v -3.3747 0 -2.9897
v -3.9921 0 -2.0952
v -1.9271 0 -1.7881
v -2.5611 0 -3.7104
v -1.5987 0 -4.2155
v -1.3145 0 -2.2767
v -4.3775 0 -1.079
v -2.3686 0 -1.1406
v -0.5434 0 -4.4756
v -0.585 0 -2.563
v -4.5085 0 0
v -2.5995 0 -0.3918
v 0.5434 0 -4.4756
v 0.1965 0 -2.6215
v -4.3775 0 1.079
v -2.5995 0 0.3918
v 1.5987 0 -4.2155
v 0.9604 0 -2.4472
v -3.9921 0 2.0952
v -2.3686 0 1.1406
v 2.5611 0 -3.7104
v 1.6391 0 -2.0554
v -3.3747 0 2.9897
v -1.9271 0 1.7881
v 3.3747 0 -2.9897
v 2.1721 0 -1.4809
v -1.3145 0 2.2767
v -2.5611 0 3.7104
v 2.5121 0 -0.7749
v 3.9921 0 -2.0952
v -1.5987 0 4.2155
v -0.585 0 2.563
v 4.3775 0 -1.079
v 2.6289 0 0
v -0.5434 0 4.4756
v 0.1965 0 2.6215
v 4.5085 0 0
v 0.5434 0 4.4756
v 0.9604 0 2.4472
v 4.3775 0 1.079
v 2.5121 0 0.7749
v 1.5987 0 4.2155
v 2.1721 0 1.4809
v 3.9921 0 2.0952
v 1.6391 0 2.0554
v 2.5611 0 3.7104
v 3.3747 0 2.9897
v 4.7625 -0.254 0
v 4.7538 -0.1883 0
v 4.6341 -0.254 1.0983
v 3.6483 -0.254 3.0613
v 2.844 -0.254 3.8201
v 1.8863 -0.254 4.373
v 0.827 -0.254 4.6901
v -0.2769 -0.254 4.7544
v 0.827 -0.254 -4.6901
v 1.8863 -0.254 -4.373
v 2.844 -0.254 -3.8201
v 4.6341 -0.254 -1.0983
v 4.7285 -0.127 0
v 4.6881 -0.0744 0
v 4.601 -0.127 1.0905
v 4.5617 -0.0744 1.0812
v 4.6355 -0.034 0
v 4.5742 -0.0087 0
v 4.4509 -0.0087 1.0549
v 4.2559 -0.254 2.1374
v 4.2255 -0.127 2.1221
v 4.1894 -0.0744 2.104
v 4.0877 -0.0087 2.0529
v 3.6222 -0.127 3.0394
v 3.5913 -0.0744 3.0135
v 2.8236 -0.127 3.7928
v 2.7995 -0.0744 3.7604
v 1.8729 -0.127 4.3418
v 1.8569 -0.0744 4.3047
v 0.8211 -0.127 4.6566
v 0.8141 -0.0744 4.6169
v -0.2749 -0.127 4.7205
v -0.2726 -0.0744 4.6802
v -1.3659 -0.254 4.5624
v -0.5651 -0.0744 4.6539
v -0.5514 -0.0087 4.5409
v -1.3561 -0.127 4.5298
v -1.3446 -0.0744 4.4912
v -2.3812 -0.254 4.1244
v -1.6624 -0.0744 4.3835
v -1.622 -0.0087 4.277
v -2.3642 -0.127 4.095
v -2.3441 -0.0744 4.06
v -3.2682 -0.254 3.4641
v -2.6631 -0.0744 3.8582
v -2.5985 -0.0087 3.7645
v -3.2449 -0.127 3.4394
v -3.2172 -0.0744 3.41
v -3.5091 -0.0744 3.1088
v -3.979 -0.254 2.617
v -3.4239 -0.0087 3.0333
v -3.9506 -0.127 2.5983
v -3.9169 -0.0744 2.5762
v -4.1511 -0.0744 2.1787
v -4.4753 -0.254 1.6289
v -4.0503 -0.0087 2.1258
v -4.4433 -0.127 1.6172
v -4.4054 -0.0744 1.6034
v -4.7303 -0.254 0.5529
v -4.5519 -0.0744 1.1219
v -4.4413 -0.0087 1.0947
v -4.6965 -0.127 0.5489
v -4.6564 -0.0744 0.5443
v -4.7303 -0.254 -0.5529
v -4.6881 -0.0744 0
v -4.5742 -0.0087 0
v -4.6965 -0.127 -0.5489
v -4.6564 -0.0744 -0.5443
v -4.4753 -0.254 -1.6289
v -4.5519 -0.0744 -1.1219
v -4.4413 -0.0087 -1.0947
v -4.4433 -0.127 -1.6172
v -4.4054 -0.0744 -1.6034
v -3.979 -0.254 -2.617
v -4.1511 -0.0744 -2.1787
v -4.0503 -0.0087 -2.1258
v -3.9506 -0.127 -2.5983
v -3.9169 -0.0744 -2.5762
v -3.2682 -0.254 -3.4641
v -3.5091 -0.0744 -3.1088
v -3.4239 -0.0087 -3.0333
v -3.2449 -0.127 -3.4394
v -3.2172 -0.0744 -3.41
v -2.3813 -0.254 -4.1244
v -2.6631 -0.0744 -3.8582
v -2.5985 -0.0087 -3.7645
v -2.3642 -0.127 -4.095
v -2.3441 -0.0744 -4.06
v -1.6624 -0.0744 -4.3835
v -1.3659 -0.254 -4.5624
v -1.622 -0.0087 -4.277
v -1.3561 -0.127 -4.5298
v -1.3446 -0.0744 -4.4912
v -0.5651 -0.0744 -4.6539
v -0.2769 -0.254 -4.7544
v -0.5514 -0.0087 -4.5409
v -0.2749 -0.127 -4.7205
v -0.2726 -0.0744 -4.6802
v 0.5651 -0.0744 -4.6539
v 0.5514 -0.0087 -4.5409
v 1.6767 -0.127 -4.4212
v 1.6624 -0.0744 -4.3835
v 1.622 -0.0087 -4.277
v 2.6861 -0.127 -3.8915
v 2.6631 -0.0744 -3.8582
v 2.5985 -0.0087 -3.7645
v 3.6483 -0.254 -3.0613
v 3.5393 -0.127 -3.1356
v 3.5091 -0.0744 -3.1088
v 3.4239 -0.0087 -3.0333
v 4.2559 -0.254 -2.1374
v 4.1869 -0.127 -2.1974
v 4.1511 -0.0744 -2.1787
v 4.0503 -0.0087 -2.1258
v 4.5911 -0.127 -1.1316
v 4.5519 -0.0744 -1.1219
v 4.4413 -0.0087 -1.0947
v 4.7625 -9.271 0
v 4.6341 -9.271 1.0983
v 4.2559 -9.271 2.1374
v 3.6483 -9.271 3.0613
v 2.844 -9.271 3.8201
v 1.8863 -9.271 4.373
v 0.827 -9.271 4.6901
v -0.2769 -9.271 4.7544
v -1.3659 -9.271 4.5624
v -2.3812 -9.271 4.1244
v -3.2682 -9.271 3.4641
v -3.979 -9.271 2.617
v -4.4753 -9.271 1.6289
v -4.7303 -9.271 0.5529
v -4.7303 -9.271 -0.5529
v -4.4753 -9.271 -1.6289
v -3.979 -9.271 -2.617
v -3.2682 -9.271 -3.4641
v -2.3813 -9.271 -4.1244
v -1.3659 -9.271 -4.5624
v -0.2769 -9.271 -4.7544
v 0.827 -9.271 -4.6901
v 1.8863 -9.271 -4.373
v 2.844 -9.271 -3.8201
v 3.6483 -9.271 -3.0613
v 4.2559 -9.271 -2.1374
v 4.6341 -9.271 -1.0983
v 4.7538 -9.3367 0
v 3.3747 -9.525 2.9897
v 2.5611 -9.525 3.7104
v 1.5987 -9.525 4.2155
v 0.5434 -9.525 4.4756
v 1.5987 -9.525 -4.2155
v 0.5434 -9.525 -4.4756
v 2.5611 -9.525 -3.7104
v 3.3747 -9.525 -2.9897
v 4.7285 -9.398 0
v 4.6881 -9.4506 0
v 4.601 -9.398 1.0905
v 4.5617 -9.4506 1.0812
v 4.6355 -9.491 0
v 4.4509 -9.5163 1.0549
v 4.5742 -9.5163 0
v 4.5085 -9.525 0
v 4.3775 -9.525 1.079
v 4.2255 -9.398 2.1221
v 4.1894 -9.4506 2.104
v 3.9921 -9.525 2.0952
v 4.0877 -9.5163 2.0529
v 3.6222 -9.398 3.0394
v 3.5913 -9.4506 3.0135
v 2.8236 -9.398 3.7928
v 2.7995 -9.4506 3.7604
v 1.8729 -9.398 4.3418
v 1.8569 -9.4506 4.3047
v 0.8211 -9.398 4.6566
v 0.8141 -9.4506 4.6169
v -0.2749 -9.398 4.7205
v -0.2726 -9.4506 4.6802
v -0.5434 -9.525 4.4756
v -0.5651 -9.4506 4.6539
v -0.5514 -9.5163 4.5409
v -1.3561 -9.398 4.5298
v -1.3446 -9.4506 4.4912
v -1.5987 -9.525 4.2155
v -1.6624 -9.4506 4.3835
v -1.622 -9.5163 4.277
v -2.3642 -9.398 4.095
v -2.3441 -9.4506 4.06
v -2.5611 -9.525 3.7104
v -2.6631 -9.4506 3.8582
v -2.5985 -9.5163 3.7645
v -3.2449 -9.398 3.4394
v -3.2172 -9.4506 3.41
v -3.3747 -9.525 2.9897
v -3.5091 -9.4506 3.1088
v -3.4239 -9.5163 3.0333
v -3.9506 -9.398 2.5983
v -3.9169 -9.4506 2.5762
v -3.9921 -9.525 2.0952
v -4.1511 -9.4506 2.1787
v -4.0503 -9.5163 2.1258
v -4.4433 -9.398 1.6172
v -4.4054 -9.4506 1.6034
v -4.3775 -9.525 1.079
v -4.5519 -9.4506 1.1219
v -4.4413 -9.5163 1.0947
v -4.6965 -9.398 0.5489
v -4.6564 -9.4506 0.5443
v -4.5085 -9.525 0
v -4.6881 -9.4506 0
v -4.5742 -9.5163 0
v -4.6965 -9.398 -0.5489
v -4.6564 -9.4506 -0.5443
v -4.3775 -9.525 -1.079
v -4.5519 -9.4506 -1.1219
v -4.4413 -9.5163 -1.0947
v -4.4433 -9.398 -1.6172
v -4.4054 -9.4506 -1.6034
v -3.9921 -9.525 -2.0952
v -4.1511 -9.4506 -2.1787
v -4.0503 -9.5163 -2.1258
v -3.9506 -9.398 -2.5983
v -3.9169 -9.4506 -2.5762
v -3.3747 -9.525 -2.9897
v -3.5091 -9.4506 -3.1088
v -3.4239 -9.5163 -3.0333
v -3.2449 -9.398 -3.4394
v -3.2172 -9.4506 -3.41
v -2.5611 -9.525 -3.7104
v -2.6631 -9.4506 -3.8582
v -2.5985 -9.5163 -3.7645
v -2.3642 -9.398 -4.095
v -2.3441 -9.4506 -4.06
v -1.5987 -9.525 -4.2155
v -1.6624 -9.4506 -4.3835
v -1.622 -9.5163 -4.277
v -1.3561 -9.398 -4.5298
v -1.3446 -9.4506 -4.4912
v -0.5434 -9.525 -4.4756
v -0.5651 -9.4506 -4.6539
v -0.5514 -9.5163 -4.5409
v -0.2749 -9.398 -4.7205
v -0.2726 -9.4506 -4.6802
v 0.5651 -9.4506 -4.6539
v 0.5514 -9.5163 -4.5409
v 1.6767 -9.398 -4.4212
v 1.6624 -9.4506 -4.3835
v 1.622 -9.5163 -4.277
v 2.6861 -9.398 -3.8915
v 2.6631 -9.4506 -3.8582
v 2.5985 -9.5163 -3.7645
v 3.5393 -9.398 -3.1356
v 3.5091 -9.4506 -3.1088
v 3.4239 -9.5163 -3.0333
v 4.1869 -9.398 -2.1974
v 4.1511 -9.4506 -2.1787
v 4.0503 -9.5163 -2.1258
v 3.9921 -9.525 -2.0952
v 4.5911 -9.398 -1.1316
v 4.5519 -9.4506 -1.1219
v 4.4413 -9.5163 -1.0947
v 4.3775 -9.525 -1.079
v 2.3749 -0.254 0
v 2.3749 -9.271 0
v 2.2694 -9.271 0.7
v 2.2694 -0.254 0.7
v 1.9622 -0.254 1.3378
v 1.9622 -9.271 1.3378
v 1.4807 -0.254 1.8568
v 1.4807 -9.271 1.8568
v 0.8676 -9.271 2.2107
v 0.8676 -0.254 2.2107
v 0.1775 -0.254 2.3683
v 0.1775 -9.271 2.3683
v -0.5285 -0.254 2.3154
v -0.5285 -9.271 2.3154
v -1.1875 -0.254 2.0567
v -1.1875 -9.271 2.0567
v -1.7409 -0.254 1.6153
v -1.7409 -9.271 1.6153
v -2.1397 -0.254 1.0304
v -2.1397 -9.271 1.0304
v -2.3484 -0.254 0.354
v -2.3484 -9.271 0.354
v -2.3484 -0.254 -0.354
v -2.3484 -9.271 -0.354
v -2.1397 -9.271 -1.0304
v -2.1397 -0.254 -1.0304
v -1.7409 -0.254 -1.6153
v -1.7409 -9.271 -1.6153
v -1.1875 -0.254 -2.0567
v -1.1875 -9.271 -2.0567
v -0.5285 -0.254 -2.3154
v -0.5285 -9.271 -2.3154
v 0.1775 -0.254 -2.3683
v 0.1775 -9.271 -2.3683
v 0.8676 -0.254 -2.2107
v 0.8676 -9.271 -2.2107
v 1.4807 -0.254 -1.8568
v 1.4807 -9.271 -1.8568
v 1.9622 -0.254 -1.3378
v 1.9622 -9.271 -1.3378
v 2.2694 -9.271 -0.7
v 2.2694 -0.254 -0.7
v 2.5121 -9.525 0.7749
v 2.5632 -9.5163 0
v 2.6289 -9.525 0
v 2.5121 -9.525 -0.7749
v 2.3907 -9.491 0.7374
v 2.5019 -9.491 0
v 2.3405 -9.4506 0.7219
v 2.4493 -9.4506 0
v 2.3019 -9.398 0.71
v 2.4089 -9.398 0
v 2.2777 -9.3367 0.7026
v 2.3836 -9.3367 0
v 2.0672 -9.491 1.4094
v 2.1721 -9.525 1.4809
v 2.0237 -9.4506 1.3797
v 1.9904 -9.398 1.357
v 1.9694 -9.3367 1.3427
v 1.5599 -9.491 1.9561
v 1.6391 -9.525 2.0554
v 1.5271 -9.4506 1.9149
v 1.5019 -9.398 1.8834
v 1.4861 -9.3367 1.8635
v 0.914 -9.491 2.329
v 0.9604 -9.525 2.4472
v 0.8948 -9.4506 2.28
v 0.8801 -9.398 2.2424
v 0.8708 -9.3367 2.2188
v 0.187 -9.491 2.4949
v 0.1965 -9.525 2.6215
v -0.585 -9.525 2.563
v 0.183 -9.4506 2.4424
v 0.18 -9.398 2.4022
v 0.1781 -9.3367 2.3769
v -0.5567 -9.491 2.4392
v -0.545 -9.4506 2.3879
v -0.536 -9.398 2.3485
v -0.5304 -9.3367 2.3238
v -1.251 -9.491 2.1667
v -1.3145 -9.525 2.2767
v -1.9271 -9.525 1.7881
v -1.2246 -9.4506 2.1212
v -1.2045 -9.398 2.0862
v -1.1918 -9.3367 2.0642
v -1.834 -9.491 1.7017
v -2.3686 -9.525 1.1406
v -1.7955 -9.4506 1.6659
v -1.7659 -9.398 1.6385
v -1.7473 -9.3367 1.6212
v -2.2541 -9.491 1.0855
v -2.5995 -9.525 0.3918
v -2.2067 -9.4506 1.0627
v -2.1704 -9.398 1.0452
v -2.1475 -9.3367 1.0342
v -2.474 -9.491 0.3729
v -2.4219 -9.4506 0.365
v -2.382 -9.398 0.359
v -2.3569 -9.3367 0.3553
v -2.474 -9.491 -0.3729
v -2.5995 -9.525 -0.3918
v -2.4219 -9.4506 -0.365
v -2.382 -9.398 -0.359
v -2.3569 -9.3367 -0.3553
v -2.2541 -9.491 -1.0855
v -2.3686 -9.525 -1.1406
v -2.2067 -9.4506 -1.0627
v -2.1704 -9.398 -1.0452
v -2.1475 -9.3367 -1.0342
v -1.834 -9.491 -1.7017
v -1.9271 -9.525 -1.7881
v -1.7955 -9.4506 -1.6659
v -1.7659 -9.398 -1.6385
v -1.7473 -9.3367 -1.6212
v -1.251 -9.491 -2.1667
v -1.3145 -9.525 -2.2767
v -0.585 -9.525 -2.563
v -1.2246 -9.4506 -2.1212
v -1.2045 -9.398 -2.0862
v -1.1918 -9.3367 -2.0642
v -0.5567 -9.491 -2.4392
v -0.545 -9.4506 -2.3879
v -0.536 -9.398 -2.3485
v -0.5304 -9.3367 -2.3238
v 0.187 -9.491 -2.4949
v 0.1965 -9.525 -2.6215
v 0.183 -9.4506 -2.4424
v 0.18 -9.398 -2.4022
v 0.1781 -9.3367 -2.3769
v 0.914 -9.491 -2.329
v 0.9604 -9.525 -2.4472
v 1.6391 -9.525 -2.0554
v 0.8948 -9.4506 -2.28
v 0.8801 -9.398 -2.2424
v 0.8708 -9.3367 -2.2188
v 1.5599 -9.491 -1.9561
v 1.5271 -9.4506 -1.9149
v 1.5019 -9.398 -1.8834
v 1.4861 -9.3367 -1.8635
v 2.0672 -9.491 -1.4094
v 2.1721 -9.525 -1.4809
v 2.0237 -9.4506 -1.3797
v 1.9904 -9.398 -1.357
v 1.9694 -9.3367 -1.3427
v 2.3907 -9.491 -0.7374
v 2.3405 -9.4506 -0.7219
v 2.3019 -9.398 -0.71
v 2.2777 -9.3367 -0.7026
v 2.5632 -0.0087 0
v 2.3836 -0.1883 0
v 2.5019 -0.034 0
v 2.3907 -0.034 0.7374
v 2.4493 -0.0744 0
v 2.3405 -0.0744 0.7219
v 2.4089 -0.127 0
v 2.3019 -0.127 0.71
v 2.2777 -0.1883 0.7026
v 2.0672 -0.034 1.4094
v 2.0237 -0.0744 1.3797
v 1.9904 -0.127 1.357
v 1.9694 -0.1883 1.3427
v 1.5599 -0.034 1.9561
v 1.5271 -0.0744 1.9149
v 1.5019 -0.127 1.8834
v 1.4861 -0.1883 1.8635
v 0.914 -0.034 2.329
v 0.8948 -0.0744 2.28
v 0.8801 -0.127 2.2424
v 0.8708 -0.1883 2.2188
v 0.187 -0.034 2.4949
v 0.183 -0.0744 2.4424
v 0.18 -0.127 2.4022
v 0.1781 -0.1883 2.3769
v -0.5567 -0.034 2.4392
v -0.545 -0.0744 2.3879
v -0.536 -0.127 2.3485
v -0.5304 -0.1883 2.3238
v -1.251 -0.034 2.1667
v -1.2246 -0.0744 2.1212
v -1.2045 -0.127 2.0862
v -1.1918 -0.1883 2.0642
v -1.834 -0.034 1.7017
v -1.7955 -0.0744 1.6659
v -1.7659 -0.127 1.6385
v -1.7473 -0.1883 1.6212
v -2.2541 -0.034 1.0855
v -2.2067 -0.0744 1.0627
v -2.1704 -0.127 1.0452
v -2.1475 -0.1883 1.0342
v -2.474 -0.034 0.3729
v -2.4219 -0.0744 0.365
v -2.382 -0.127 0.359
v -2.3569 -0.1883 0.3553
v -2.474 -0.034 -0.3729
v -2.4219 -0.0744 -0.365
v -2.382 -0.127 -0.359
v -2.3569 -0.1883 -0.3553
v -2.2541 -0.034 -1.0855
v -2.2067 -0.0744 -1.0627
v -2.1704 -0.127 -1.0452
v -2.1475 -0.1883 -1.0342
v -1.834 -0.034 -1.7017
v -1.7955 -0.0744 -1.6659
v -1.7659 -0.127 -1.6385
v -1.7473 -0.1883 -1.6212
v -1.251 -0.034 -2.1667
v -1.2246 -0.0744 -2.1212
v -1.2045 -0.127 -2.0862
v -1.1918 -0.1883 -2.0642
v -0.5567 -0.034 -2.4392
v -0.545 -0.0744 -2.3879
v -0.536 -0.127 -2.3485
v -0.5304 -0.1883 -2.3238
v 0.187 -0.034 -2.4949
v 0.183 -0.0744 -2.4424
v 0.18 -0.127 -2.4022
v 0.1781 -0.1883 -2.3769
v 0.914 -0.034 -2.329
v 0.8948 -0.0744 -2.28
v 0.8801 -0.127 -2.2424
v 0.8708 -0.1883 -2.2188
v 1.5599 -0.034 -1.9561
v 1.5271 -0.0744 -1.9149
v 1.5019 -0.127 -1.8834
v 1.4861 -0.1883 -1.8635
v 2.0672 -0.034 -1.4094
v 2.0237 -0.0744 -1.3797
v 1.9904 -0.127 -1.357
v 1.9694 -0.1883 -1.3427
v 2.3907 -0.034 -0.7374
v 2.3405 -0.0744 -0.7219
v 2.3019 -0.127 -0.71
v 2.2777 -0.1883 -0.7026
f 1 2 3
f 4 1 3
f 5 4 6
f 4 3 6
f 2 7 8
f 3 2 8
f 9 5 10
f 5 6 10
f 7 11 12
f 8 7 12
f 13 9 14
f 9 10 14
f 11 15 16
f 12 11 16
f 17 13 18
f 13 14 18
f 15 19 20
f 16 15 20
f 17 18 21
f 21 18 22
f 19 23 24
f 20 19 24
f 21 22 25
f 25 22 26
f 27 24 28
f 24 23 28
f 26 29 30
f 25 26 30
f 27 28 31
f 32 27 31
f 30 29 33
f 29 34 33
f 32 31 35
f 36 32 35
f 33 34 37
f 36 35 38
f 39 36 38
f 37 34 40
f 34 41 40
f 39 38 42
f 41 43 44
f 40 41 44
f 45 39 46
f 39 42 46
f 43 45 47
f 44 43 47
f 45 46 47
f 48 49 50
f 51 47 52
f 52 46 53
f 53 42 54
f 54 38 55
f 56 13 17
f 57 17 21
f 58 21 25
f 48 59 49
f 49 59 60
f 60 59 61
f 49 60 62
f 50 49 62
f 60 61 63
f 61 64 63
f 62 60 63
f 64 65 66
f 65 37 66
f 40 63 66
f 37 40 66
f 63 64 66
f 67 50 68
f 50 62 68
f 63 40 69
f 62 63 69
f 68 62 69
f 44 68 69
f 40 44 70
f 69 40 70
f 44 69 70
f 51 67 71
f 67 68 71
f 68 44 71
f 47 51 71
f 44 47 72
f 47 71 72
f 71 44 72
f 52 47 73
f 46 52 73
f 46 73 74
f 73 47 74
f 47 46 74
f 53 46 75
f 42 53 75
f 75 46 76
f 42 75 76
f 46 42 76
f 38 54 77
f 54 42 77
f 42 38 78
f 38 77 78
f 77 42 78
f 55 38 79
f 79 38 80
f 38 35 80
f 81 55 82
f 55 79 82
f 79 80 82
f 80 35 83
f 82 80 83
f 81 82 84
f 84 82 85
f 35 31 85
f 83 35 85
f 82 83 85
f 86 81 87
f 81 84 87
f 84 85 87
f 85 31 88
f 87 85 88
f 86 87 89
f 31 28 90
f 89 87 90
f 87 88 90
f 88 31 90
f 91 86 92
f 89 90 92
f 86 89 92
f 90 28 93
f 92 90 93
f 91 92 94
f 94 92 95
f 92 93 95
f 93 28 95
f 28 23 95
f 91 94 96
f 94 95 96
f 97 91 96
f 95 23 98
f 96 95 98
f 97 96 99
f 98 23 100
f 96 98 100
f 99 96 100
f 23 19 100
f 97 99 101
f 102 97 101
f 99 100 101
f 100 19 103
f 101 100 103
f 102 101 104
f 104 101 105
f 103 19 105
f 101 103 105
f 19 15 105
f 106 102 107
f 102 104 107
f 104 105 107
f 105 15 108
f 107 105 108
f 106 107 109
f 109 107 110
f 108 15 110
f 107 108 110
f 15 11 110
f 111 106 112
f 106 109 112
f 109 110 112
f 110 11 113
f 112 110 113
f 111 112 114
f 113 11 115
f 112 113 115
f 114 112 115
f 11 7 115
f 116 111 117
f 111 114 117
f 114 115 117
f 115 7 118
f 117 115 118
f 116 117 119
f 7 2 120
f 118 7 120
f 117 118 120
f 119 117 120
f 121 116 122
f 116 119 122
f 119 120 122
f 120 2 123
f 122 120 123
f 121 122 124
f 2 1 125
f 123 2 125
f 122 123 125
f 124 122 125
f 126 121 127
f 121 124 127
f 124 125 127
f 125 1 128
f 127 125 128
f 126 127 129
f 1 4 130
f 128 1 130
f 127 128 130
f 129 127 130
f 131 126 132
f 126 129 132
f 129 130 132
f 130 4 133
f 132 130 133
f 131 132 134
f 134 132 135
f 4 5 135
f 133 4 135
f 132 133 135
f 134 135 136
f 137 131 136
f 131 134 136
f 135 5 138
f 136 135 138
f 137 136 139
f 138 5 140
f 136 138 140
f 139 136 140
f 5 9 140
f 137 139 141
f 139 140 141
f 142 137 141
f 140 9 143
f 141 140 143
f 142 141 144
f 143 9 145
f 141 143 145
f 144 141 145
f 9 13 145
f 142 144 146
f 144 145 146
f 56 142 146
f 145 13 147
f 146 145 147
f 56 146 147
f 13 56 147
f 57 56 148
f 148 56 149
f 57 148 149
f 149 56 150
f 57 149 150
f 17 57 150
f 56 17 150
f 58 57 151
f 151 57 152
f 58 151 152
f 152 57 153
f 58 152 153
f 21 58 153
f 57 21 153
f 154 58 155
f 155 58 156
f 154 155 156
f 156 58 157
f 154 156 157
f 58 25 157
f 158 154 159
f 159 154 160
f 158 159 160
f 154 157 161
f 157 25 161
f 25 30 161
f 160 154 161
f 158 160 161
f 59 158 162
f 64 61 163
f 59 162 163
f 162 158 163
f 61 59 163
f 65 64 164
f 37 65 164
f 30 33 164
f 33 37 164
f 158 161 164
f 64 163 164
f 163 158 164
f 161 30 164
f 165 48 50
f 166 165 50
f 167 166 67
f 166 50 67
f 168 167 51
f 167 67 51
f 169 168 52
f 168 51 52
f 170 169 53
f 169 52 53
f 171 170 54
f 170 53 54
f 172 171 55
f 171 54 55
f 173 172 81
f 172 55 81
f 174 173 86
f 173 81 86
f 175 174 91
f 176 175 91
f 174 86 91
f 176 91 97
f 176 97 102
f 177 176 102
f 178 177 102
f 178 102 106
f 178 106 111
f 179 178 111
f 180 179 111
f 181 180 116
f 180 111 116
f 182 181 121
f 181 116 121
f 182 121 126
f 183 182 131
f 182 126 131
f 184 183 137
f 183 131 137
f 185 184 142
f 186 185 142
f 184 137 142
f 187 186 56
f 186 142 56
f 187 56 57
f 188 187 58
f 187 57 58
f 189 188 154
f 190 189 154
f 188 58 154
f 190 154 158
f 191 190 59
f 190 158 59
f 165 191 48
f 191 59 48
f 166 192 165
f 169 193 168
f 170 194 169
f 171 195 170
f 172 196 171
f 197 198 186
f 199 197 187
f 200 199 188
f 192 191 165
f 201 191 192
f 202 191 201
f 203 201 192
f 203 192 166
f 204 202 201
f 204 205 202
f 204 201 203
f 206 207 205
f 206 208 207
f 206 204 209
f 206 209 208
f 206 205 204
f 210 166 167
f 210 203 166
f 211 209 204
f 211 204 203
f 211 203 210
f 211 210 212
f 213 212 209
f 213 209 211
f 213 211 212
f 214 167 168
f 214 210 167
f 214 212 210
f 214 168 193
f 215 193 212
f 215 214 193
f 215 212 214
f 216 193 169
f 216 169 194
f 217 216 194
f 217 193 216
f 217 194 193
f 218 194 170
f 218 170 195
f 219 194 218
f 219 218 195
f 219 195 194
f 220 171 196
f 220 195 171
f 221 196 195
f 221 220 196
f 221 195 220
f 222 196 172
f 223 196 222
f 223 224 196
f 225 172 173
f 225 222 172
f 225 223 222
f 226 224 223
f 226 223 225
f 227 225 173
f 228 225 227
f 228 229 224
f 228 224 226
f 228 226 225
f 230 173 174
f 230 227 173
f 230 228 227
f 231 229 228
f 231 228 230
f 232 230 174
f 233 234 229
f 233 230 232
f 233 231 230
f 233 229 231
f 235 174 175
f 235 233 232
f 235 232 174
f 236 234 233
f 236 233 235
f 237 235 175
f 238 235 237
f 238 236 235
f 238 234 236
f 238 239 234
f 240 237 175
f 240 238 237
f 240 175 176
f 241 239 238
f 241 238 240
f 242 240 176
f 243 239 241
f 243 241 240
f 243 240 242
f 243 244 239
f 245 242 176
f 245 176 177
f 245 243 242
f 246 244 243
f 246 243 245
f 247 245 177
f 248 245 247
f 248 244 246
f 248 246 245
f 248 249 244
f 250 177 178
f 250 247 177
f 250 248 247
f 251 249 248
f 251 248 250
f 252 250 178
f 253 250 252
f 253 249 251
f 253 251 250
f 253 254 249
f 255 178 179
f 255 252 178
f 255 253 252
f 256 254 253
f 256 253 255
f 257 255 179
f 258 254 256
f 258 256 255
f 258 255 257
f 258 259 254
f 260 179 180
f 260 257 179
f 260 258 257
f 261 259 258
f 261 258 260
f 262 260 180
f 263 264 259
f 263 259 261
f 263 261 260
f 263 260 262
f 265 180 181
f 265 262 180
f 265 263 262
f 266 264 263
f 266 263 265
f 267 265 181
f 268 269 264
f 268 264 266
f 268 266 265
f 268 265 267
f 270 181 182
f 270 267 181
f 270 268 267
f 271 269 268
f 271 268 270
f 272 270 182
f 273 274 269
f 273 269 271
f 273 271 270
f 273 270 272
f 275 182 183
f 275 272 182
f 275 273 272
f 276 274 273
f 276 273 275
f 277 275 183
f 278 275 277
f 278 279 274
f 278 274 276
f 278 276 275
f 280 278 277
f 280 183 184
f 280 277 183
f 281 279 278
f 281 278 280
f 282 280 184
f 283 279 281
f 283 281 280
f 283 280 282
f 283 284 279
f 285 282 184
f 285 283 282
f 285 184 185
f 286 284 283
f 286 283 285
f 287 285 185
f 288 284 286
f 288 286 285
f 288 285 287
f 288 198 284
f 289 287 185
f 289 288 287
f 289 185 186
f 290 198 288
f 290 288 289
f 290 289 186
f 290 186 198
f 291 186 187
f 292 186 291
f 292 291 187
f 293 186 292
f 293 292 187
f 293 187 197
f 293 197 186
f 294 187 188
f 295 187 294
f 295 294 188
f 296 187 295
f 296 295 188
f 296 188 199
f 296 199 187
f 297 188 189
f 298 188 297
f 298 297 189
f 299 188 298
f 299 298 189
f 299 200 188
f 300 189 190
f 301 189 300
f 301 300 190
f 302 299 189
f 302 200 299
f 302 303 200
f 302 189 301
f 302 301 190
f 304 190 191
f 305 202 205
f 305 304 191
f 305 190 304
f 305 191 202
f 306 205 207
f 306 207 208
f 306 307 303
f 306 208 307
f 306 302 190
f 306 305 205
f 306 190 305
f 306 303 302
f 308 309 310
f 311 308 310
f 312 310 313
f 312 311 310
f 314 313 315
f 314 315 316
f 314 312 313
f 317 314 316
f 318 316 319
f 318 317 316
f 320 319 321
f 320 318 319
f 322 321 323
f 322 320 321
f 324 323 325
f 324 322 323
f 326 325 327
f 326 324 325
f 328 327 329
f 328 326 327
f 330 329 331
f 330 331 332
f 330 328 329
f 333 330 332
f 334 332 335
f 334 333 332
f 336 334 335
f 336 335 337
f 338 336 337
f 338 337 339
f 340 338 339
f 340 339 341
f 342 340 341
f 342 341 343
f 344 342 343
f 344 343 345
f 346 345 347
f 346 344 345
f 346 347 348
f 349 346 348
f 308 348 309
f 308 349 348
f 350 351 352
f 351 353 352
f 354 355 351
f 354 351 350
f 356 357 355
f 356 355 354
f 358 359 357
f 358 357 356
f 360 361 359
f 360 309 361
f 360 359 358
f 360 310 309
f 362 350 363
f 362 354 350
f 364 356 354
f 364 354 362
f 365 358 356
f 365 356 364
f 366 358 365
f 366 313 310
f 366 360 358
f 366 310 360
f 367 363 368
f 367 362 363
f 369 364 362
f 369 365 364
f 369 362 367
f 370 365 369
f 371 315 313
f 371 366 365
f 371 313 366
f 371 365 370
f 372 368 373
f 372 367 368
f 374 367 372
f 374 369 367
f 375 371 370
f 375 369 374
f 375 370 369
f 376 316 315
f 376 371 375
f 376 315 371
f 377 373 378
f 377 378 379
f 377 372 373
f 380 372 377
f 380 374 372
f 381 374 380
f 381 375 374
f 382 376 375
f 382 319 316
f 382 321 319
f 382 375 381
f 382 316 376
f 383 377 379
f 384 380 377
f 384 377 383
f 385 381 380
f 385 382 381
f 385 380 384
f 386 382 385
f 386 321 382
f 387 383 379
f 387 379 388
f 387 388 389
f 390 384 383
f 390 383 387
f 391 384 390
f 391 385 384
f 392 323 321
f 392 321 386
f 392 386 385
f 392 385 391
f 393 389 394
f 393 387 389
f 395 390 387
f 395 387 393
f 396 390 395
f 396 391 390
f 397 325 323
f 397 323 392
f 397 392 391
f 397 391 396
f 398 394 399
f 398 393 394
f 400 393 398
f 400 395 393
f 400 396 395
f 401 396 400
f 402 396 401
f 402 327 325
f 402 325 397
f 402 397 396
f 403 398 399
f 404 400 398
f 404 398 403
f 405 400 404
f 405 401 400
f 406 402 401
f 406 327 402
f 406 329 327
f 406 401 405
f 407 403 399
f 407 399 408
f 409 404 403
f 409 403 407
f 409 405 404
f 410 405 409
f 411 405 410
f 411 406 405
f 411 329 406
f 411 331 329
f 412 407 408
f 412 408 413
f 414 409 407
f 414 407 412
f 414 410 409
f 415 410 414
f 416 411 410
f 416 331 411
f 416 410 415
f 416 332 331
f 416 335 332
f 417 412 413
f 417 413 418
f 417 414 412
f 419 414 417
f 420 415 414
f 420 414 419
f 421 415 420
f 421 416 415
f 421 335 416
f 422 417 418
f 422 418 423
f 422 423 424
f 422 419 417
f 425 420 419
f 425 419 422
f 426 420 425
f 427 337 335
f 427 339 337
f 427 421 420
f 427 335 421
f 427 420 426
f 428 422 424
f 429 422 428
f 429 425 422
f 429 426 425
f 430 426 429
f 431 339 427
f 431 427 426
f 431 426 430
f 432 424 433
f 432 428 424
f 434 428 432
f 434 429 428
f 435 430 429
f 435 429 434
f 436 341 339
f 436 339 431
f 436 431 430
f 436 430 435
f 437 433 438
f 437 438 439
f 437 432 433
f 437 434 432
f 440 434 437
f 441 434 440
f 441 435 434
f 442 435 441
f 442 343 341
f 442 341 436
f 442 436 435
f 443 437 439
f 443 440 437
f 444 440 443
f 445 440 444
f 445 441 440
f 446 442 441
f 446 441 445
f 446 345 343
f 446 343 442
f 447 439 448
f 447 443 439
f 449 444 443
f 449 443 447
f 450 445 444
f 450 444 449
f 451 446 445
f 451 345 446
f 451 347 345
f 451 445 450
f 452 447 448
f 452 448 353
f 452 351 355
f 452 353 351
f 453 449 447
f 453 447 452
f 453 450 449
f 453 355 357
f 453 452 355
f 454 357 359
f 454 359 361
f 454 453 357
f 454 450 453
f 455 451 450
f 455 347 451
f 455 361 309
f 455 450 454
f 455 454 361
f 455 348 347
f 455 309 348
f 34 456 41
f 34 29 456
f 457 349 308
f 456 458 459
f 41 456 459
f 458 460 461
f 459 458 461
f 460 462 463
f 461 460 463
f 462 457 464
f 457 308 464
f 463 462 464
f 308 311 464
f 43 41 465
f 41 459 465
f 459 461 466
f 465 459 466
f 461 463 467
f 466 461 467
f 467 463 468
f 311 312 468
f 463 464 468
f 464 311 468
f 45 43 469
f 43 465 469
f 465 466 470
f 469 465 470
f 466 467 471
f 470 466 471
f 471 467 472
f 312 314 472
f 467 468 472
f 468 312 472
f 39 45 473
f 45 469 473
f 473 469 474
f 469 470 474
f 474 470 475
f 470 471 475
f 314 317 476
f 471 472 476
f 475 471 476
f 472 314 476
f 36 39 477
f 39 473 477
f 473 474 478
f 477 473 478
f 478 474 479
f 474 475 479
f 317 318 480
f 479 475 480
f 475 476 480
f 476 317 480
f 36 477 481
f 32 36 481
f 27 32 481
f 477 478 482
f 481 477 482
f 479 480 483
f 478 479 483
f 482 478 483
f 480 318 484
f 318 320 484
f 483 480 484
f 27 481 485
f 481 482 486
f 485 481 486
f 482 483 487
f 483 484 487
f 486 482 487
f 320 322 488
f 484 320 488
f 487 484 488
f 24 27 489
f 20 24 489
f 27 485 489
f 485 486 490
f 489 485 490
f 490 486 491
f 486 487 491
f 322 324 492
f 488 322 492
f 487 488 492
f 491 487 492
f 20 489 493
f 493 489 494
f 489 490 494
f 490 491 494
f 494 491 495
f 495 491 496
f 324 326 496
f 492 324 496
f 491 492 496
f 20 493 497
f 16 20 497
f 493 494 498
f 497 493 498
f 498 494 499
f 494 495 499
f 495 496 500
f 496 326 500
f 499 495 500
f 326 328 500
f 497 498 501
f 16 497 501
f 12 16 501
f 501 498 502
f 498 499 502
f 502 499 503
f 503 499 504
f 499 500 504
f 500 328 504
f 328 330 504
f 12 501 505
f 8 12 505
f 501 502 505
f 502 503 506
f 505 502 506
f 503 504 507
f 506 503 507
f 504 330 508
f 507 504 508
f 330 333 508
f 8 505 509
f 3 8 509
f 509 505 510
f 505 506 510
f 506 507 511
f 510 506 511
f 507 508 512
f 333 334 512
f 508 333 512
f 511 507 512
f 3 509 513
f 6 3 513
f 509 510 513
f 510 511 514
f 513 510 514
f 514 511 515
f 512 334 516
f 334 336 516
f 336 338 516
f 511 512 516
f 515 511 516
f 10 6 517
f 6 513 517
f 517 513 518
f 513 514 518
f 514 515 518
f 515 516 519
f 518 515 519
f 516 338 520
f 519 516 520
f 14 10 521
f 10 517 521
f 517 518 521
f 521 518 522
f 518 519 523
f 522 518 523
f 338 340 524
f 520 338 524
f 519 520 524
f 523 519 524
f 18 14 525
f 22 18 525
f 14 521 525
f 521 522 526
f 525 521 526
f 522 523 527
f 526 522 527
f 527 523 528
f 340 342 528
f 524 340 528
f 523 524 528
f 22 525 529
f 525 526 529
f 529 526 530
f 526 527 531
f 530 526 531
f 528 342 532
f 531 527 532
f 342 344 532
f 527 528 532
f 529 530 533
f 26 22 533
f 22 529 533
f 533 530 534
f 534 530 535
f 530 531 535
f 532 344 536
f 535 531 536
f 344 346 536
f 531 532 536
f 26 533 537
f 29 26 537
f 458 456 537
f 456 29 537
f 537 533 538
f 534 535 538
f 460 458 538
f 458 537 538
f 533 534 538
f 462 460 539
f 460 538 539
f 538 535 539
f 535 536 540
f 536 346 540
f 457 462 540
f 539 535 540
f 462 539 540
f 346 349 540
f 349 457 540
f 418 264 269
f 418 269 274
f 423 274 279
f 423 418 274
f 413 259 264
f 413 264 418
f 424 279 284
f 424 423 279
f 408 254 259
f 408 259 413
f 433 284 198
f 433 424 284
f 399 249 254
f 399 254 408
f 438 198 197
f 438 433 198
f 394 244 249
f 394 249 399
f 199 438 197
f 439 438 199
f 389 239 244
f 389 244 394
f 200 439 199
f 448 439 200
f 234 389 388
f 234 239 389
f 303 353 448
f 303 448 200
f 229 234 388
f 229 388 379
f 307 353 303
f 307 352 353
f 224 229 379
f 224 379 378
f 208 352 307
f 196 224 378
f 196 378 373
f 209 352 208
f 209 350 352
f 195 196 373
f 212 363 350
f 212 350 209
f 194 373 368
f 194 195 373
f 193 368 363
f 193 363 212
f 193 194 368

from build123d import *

# Parameters (mm, degrees)
F0_R     = 4.7625
F0_R_2   = 2.3749
F1_DEPTH = 9.525
F2_R     = 0.254
F3_R     = 0.254


with BuildPart() as f1:
    # F0 (on Front) → F1 (new body)
    with BuildSketch(Plane.XZ):
        Circle(F0_R)
        Circle(F0_R_2, mode=Mode.SUBTRACT)
    extrude(amount=F1_DEPTH)

    # F2
    f2_edges = [f1.edges().sort_by_distance(p)[0] for p in [
        (-4.7625, -9.525, 0),
        (-4.7625, 0, 0),
    ]]
    fillet(f2_edges, radius=F2_R)

    # F3
    f3_edges = [f1.edges().sort_by_distance(p)[0] for p in [
        (-2.3749, -9.525, 0),
        (-2.3749, 0, 0),
    ]]
    fillet(f3_edges, radius=F3_R)


solid = f1.part
